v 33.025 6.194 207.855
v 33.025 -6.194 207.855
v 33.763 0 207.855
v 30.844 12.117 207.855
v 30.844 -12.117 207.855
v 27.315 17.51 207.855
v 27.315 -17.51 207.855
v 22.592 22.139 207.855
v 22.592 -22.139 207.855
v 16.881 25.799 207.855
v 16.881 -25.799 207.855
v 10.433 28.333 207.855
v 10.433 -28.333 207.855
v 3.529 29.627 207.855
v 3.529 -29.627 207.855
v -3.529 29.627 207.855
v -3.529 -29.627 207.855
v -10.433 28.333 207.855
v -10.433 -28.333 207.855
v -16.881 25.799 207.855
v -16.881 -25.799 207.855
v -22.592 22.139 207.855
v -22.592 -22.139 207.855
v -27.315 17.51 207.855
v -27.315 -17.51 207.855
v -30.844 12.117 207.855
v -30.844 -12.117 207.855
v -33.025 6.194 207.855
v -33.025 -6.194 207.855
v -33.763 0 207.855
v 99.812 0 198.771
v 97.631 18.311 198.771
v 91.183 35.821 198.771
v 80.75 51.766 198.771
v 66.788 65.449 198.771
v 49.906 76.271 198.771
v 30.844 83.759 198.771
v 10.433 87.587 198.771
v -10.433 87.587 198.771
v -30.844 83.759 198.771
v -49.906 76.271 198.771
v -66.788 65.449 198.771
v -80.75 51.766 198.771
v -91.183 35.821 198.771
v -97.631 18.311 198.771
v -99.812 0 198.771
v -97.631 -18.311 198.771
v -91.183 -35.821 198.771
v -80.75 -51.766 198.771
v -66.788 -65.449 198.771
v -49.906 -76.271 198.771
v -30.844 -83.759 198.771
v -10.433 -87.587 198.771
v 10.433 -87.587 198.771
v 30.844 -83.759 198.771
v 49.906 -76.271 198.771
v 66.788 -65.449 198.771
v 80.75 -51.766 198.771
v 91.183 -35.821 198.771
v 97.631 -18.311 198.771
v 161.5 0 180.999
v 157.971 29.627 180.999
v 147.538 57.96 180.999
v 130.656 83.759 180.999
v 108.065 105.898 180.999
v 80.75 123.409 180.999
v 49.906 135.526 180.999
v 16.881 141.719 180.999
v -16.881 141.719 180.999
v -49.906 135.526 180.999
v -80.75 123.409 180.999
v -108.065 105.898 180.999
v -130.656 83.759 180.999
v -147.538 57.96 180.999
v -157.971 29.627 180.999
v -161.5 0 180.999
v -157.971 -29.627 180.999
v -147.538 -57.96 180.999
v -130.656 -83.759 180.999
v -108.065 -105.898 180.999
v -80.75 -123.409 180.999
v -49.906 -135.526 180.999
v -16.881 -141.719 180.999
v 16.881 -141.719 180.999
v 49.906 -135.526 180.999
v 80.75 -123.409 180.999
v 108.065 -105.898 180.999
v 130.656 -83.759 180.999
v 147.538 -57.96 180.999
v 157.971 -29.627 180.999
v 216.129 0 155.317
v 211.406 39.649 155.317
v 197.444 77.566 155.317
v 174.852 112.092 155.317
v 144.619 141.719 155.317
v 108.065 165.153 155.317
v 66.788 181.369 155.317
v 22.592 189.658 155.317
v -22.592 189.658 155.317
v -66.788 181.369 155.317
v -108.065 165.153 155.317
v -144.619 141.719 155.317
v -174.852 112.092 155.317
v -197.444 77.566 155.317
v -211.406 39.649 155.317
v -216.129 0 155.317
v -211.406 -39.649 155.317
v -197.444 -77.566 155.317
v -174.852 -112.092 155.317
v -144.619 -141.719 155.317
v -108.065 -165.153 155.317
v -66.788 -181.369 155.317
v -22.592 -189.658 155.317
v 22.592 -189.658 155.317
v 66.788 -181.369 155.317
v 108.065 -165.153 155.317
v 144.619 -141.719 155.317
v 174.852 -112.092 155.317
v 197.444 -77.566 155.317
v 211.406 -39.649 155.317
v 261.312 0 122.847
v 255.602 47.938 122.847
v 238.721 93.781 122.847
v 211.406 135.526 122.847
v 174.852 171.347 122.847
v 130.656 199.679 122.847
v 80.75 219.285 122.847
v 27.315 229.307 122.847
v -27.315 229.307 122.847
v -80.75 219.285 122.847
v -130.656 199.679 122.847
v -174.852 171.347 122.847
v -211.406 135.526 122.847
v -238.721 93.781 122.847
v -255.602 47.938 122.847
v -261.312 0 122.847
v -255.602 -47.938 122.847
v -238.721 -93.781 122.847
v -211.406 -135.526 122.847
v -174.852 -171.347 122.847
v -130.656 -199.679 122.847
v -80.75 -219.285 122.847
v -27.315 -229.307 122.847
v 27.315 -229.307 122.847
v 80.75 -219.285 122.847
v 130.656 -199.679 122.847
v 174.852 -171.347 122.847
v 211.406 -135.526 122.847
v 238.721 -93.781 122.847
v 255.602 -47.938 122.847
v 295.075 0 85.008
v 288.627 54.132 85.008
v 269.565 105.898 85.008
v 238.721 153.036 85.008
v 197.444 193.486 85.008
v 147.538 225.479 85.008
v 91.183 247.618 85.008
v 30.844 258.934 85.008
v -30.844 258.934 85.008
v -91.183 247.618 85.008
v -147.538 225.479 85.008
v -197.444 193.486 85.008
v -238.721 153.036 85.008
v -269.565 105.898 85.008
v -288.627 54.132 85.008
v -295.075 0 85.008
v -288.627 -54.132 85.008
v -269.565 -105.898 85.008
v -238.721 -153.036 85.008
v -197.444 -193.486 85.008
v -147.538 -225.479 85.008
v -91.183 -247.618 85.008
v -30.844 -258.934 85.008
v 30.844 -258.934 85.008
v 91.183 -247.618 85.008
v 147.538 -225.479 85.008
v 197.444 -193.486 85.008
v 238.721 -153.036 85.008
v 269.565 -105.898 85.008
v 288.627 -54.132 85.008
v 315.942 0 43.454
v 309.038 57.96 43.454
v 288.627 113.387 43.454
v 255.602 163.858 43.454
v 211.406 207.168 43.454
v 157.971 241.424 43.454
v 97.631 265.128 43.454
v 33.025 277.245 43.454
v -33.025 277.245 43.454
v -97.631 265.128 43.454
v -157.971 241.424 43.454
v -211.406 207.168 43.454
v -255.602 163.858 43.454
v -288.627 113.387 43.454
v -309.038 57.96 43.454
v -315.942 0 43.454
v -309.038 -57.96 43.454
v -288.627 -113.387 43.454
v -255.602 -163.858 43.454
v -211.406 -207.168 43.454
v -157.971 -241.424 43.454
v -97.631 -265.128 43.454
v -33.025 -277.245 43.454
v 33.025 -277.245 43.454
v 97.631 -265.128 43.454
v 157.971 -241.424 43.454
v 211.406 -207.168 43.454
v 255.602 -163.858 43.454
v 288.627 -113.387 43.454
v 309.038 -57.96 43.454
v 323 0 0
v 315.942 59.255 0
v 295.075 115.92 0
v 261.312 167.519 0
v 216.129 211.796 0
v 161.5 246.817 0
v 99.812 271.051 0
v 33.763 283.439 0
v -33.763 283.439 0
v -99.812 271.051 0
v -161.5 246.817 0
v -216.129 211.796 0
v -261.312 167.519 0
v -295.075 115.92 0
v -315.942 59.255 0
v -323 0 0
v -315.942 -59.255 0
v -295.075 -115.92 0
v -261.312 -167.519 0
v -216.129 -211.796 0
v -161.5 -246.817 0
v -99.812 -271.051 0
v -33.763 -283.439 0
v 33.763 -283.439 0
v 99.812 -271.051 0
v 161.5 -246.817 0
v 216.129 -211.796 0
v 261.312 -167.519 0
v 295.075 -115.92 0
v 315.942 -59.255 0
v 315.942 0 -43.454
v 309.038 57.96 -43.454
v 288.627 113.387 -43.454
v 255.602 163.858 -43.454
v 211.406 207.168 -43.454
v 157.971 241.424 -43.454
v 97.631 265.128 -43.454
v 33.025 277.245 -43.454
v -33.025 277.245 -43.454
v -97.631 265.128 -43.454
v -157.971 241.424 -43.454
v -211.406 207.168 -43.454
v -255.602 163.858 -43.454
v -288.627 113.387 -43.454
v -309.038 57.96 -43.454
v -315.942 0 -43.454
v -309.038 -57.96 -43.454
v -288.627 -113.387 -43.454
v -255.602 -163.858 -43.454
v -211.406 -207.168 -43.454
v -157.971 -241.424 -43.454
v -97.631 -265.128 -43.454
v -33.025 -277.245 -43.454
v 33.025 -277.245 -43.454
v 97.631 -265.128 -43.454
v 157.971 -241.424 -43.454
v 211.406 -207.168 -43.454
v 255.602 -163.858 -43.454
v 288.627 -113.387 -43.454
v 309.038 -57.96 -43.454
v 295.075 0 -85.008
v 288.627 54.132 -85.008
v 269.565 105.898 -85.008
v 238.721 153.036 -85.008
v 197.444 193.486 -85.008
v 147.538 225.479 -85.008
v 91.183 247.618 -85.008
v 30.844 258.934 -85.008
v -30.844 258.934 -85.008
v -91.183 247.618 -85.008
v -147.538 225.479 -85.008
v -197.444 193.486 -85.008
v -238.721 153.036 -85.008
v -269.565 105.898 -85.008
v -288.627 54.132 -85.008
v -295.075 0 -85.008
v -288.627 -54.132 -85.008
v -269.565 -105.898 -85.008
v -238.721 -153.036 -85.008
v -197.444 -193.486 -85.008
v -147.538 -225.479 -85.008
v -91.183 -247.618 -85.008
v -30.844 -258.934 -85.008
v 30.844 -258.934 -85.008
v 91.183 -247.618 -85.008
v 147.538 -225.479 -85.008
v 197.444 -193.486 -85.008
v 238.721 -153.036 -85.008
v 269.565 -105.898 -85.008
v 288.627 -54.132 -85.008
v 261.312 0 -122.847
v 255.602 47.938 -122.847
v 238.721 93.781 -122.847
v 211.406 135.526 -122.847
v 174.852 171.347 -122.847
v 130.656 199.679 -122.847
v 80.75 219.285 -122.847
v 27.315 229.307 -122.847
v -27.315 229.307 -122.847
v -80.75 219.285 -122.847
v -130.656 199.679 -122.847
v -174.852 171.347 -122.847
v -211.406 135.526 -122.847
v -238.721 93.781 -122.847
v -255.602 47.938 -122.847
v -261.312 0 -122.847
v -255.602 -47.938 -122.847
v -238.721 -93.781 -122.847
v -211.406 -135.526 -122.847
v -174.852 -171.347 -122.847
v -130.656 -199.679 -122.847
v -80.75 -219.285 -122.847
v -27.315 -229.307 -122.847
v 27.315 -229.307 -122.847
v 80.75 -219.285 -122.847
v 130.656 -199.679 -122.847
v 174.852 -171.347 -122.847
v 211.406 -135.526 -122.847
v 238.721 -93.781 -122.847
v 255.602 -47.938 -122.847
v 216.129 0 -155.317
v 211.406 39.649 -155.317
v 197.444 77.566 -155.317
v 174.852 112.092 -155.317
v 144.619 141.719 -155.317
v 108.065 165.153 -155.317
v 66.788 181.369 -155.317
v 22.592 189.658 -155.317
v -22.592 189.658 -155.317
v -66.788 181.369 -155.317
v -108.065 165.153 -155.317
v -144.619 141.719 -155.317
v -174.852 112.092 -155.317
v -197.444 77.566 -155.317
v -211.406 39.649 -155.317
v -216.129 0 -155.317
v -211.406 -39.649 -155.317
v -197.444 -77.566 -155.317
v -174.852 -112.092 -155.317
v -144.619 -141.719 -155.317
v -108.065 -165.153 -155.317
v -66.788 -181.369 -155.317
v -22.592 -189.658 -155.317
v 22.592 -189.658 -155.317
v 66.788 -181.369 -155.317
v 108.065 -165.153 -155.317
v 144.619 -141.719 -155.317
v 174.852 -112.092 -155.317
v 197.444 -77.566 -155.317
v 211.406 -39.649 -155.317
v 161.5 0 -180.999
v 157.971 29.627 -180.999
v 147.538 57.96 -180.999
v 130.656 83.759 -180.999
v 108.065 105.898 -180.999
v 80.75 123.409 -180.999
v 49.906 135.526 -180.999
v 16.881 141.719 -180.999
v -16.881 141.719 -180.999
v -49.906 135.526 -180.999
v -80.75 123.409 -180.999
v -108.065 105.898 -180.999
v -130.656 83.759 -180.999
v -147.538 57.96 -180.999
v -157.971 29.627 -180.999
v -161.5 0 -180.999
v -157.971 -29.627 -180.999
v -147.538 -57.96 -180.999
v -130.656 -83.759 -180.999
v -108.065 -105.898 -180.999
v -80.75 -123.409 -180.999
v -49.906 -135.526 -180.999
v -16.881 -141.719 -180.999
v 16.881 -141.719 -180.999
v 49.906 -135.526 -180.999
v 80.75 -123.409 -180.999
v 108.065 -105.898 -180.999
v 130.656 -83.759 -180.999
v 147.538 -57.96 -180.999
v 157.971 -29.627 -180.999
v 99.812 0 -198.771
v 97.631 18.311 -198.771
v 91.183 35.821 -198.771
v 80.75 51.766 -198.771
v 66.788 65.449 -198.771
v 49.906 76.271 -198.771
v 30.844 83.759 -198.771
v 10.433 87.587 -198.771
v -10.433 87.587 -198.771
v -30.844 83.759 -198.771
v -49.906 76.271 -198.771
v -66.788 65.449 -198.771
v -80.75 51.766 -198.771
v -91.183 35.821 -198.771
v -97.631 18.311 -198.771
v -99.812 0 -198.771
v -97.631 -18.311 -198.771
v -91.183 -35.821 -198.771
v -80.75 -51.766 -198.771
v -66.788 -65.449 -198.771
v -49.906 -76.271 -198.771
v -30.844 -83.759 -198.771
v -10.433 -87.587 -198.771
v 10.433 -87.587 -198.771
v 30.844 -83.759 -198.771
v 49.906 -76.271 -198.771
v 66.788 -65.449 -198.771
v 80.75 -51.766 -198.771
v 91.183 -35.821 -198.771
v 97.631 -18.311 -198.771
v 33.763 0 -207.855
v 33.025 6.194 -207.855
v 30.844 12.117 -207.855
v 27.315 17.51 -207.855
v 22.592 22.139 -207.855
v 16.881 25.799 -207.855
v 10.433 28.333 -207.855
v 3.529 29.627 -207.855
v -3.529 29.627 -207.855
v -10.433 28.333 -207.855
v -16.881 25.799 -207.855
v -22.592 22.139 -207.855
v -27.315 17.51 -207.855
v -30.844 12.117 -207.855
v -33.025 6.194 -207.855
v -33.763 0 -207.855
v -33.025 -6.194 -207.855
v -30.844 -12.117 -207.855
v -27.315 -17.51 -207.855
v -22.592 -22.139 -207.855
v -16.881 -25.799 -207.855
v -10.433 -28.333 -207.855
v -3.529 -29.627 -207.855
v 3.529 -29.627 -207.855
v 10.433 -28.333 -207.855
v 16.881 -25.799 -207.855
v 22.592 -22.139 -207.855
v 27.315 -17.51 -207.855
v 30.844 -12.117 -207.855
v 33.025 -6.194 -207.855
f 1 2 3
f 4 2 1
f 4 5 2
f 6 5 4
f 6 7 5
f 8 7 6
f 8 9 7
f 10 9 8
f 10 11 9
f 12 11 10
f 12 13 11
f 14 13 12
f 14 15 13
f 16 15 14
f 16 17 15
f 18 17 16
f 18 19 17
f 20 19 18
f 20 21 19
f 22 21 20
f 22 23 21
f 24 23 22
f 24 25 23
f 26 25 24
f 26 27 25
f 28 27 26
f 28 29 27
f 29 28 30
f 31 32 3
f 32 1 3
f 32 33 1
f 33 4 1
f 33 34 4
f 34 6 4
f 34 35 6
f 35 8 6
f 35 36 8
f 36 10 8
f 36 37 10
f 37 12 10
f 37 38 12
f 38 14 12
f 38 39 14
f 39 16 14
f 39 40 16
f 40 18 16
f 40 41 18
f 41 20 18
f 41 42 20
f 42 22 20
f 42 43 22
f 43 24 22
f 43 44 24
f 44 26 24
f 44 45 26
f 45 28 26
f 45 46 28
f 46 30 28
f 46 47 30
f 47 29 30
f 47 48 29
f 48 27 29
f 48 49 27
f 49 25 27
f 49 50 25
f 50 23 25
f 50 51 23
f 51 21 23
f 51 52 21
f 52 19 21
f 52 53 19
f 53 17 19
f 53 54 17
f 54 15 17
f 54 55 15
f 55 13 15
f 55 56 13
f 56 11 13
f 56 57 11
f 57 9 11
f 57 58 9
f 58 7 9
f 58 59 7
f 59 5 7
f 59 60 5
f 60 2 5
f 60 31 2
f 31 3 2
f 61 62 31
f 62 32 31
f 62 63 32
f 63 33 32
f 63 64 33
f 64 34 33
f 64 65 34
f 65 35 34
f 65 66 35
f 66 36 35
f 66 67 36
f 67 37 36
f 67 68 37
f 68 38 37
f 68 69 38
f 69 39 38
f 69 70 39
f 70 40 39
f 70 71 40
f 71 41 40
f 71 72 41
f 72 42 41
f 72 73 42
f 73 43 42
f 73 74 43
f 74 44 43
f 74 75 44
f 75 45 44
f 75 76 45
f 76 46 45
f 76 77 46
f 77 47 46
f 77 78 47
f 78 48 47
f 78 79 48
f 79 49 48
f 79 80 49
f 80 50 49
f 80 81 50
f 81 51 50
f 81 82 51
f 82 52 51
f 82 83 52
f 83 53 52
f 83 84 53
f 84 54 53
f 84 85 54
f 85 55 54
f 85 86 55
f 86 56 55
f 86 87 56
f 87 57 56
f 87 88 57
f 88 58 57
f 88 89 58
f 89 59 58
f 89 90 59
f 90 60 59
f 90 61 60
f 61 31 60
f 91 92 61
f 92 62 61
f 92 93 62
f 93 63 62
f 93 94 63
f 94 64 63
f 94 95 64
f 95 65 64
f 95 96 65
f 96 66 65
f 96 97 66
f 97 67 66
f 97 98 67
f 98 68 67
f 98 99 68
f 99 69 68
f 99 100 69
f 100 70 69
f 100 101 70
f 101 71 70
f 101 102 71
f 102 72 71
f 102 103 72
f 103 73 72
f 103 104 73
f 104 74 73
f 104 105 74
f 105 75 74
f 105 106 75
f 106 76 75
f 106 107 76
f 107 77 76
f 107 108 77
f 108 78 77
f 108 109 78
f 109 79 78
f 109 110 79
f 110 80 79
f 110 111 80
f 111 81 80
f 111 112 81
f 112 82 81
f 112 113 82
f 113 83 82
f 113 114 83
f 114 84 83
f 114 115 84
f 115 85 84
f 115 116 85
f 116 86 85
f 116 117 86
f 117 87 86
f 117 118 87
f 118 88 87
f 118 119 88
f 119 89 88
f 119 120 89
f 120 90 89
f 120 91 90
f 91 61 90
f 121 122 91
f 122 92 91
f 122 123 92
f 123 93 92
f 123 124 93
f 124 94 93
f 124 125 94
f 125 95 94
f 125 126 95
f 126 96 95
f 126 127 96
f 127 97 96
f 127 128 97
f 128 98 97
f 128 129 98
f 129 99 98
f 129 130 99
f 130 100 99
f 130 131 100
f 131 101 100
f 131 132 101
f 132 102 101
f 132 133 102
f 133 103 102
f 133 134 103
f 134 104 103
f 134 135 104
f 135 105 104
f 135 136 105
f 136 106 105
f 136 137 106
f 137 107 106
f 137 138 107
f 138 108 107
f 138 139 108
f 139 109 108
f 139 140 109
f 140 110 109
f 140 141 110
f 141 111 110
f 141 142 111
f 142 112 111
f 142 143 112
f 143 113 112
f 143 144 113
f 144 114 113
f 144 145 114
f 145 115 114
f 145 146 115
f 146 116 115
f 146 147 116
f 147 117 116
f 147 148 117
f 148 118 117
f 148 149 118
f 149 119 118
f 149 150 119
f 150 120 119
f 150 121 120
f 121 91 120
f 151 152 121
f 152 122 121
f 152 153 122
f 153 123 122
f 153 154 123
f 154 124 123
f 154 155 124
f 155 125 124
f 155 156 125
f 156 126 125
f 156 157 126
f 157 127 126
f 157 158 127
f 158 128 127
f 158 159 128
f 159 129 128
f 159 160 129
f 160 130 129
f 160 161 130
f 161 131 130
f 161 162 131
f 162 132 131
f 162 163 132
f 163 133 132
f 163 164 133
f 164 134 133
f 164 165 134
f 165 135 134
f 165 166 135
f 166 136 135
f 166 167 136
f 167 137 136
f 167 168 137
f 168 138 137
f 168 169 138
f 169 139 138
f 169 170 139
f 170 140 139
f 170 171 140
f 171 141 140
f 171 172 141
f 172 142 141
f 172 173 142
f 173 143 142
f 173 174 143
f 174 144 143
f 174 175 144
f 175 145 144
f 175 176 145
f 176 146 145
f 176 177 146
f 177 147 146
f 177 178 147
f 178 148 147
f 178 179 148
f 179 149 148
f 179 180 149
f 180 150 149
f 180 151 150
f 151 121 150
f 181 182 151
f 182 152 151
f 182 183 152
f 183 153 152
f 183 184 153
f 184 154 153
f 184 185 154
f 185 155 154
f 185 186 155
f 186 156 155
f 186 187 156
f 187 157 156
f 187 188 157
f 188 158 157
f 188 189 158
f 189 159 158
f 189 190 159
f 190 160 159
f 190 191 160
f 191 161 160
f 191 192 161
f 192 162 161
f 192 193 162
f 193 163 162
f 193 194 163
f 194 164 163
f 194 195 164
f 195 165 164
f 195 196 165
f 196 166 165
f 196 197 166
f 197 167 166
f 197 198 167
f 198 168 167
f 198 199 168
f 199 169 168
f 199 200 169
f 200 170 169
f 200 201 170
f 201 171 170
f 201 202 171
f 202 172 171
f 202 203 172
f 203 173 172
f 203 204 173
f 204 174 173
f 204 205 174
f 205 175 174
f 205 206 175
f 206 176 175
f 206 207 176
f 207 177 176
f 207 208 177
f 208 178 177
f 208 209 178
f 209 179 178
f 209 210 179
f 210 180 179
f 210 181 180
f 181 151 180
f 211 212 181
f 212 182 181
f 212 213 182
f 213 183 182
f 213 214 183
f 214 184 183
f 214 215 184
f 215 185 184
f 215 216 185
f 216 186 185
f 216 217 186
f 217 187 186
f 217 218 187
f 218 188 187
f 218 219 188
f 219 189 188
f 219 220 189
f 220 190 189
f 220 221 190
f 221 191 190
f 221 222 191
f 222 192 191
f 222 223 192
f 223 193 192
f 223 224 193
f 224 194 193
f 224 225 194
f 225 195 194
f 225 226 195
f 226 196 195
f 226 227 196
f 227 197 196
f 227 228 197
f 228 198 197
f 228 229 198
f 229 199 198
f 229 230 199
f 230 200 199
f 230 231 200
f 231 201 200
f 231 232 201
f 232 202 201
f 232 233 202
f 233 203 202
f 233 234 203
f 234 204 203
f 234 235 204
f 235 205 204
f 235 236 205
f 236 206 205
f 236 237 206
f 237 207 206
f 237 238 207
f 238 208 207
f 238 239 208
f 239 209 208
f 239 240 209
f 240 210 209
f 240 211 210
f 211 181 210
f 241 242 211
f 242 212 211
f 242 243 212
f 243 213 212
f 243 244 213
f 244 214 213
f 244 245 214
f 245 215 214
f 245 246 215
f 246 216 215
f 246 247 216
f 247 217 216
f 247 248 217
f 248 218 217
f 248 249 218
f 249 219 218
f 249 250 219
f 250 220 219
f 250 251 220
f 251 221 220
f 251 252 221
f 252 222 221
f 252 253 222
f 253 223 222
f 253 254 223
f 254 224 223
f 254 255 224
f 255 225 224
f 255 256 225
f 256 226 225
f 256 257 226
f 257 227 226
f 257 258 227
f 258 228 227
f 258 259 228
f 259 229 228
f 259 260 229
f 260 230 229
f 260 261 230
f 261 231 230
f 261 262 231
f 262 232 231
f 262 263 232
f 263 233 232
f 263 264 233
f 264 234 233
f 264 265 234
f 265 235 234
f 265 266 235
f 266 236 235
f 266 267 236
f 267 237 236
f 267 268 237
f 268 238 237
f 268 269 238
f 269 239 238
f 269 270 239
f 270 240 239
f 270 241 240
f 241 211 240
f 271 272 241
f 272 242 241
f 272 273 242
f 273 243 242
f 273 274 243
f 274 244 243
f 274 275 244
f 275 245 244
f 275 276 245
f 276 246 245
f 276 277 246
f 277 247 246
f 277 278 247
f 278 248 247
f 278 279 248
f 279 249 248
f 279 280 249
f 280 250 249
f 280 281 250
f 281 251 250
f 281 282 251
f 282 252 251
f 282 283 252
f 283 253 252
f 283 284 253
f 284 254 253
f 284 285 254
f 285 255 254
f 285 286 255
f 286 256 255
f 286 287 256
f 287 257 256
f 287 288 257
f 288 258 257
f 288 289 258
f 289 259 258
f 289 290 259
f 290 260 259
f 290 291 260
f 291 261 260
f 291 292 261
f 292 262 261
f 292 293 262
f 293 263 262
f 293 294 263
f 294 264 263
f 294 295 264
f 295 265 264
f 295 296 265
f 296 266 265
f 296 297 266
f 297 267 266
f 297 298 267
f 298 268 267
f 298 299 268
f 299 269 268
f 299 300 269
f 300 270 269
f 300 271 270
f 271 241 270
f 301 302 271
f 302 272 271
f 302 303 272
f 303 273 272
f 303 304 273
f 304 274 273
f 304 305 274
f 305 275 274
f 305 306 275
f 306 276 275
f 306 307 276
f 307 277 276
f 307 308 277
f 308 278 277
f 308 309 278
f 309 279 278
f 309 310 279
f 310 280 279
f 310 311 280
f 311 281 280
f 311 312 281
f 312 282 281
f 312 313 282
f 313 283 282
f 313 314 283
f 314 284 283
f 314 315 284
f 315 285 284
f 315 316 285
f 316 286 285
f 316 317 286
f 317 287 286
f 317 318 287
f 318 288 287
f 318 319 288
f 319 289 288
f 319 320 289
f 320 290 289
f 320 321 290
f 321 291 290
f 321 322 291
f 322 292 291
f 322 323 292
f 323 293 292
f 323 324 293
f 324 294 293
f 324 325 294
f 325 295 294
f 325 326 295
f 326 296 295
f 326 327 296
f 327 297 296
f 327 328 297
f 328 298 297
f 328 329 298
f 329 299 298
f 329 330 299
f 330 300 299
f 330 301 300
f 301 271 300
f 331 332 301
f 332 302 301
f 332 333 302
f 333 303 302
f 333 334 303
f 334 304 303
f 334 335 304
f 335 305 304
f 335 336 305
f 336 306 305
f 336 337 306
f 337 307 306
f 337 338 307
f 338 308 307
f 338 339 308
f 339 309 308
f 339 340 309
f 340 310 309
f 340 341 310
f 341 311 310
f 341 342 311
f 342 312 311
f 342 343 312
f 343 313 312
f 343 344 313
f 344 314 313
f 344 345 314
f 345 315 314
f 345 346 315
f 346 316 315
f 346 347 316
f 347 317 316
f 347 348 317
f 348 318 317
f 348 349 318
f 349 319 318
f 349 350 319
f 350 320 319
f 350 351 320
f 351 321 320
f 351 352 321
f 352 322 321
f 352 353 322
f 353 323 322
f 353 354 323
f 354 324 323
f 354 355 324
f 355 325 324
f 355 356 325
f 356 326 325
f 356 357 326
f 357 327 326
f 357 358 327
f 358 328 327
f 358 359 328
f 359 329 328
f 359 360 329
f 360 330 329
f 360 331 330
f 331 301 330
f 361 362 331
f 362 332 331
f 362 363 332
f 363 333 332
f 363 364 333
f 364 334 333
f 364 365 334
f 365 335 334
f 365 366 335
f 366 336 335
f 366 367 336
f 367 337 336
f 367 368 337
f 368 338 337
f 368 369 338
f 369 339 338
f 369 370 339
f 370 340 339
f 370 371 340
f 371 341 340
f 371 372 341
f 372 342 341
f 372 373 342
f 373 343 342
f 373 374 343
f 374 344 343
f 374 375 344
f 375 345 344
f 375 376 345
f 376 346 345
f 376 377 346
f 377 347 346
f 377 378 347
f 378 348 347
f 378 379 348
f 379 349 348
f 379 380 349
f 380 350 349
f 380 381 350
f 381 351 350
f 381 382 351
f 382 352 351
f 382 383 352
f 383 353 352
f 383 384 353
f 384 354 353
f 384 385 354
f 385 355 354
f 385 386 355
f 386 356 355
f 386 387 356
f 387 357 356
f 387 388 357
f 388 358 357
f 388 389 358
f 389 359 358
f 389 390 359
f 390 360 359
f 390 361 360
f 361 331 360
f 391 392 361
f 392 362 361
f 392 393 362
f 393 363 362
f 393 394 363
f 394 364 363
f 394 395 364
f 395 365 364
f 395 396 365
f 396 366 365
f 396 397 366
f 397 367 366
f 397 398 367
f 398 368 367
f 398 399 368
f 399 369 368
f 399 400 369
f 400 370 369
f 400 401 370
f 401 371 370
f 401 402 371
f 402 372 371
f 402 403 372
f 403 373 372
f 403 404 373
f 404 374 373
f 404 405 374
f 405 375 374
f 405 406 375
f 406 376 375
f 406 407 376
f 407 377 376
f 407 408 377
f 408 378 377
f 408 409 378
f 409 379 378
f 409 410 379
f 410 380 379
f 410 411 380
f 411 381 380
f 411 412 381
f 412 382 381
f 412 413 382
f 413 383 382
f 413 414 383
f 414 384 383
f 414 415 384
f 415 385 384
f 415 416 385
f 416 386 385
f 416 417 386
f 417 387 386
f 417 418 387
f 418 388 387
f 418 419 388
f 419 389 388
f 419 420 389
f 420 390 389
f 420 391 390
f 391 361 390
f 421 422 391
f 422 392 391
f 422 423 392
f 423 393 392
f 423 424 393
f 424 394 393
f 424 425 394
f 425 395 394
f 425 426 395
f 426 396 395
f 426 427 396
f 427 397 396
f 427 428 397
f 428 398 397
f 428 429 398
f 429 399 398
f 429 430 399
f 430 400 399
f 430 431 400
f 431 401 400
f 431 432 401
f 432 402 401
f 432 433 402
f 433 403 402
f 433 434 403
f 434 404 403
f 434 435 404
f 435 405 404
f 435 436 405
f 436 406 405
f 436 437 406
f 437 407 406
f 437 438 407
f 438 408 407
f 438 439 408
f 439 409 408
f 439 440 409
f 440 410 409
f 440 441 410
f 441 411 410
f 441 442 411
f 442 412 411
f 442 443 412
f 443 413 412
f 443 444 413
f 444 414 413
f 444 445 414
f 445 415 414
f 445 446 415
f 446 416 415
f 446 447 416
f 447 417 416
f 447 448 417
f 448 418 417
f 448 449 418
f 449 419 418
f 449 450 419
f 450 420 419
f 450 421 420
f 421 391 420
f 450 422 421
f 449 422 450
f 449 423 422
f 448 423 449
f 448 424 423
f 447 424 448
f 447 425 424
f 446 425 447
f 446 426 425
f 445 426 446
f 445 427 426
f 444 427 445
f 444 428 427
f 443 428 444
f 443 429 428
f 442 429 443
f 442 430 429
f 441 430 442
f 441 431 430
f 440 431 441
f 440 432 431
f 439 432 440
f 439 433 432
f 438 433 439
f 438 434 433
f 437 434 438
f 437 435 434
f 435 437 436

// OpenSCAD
// Generated by SolidPython 1.0.1 on 2020-07-29 00:46:53


scale(v = [17, 15, 11]) {
	sphere(r = 19);
}
/***********************************************
*********      SolidPython code:      **********
************************************************
 
# import packages: SolidPython
from solid import *
from solid.utils import *
from itertools import chain, combinations, permutations


class Resize:

    def __init__(self, scad_file):
        self.scad_file = scad_file
        #self.scad_file = import_scad(scad_file)
        # cone/cylinder param:
        self.r1 = 0
        self.r2 = 0
        self.h = 0
        # rectangular prism param:
        self.w = 0
        self.l = 0
        # ellipse param:
        self.r = 0

    # import OpenScad code (file name corresponds to shape)


    # classify shape + parameters
    def assign(self, param1, param2, param3):
        if self.scad_file == 'cone.scad':
            self.r1 = param1
            self.r2 = param2
            self.h = param3
        elif self.scad_file == 'cylinder.scad':
            self.r1 = param1
            self.r2 = param2
            self.h = param3
        elif self.scad_file == 'rectangularPrism.scad':
            self.h = param1
            self.l = param2
            self.w = param3
        else:
            self.r = param1
            self.h = param2

    # resize parameters
    def iterate(self):
        x = range(3, 20, 2)
        i = 1
        if self.scad_file == 'cone.scad':
            tempList = list(permutations(x, 2))
            for temp in tempList:
                param1 = temp[0]
                param2 = temp[1]
                filepath = 'produced_scad_files/' + 'cone' + str(param1) + '_' + str(param2) + '_' + '.scad'
                scad_render_to_file(cylinder(h=param1, r1=param2, r2=0), filepath)

        elif self.scad_file == 'cylinder.scad':
            tempList = list(permutations(x, 3))
            for temp in tempList:
                param1 = temp[0]
                param2 = temp[1]
                filepath = 'produced_scad_files/' + 'cylinder' + str(param1) + '_' + str(param2) + '_' + '.scad'
                scad_render_to_file(cylinder(h=param1, r1=param2, r2=param2), filepath)

        elif self.scad_file == 'rectangularPrism.scad':
            tempList = list(permutations(x, 3))
            for temp in tempList:
                param1 = temp[0]
                param2 = temp[1]
                param3 = temp[2]
                filepath = 'produced_scad_files/' + 'rectangularPrism' + str(param1) + '_' + str(param2) + '_' + str(
                    param3) + '.scad'
                scad_render_to_file(cube(size=(param1, param2, param3)), filepath)

        elif self.scad_file == 'ellipse.scad':
            tempList = list(permutations(x, 4))
            for temp in tempList:
                param1 = temp[0]
                param2 = temp[1]
                param3 = temp[2]
                param4 = temp[3]
                filepath = 'produced_scad_files/' + 'ellipse' + str(param1) + '_' + str(param2) + '_' + str(param3) + '_' + str(param4) + '.scad'
                scad_render_to_file(scale([param1, param2, param3])(sphere(r=param4)), filepath)

    def render_to_scadfile(self):
        scad_render_to_file(scad, 'example.scad') 
 
************************************************/
